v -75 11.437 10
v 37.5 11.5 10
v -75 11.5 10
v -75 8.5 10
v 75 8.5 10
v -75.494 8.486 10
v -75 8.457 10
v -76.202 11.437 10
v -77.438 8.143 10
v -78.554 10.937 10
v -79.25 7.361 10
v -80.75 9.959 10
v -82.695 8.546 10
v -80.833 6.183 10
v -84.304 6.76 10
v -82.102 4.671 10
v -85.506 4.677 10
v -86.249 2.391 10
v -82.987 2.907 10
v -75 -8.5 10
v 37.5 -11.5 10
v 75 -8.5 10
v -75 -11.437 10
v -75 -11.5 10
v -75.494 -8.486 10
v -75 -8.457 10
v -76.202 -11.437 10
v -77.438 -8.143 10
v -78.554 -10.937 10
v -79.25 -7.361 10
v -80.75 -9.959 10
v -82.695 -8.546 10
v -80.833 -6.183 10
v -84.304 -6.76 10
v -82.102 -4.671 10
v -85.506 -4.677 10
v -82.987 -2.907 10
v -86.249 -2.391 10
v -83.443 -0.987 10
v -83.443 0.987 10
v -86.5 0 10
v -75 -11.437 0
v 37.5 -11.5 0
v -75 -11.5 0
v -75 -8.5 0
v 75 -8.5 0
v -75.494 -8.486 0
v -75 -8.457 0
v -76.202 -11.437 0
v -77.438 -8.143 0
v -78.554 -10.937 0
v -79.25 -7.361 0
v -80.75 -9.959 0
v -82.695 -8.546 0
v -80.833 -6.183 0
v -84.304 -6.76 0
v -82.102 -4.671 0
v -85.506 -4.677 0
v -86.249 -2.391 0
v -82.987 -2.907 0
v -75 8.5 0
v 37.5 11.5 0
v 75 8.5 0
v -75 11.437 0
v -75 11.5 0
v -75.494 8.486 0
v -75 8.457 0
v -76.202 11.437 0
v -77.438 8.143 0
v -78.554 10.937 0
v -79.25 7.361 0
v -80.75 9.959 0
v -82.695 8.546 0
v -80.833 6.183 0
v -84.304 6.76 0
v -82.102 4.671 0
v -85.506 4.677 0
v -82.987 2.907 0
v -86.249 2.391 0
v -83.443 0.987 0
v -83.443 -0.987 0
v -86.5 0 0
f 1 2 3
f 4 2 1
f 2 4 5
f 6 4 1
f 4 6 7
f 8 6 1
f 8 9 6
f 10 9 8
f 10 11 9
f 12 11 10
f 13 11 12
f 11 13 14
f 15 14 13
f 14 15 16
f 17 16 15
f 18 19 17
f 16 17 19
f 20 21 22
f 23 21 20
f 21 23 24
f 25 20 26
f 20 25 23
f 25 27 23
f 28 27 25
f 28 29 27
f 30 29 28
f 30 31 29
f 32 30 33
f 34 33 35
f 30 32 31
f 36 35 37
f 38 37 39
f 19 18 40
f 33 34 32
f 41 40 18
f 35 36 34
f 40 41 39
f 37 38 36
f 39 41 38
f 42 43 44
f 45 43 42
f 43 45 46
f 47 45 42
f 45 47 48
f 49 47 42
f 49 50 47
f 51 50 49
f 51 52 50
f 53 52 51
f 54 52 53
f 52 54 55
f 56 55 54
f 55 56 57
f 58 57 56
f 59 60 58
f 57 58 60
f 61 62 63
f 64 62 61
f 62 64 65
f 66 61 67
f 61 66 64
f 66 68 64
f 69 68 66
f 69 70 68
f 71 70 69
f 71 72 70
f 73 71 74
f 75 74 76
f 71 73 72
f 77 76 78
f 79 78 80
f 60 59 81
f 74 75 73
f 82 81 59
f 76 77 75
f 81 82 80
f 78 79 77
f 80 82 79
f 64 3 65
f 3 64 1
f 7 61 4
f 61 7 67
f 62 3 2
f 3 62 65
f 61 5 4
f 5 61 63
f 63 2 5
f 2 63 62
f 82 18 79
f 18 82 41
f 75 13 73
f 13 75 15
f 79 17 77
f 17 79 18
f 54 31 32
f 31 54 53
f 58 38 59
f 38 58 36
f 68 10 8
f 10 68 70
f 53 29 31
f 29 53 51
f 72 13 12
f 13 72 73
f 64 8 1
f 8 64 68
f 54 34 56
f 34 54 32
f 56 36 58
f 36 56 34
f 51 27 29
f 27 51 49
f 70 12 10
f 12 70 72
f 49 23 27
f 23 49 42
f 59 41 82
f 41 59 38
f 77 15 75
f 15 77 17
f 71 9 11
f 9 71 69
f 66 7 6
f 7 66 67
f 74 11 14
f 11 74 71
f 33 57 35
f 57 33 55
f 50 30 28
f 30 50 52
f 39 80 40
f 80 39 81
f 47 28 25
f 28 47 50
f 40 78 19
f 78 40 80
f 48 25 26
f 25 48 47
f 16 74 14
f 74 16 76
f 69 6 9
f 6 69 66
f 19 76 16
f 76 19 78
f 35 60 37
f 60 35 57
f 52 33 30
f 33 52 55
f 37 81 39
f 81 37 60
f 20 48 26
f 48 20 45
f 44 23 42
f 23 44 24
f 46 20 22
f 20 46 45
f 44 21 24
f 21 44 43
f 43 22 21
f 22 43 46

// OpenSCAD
lenght = 150;
width = 20;
height = 10;
line = 3;

module handle_bottom(side) {
    handle_points = [
        [  0,  0,  0 ],  //0
        [ lenght/2,  0,  0 ],  //1
        [ lenght/4,  line*side,  0 ],  //2
        [  0,  line*side,  0 ],  //3
        [  0,  0,  height ],  //4
        [ lenght/2,  0,  height ],  //5
        [ lenght/4,  line*side,  height ],  //6
        [  0,  line*side,  height ]]; //7
  
    handle_faces = [
        [0,1,2,3],  // bottom
        [4,5,1,0],  // front
        [7,6,5,4],  // top
        [5,6,2,1],  // right
        [6,7,3,2],  // back
        [7,4,0,3]]; // left
    
    translate([0, -line*side/2, 0])
        polyhedron( handle_points, handle_faces );
}
module right_part() {
    union() {
        translate([-lenght/4, width/2, height/2])
            cube([lenght/2, line, height], center =true);
        translate([0, width/2, 0])
            handle_bottom(1);
    }
}
module top_part() {
    translate([(-lenght)/2, 0, 0]) difference() {
        cylinder(d=width+line, h=height);
        cylinder(d=width-line, h=height);
        translate([(width+line)/2, 0, height/2])
            cube([width+line, width+line, height], center =true);
    }
}

module left_part() {
    union() {
        translate([-lenght/4, -width/2, height/2])
            cube([lenght/2, line, height], center =true);
        translate([0, -width/2, 0])
            handle_bottom(-1);
    }
}
module full_tongs() {
    union() {
        right_part();
        top_part();
        left_part();
    }
}
full_tongs();
